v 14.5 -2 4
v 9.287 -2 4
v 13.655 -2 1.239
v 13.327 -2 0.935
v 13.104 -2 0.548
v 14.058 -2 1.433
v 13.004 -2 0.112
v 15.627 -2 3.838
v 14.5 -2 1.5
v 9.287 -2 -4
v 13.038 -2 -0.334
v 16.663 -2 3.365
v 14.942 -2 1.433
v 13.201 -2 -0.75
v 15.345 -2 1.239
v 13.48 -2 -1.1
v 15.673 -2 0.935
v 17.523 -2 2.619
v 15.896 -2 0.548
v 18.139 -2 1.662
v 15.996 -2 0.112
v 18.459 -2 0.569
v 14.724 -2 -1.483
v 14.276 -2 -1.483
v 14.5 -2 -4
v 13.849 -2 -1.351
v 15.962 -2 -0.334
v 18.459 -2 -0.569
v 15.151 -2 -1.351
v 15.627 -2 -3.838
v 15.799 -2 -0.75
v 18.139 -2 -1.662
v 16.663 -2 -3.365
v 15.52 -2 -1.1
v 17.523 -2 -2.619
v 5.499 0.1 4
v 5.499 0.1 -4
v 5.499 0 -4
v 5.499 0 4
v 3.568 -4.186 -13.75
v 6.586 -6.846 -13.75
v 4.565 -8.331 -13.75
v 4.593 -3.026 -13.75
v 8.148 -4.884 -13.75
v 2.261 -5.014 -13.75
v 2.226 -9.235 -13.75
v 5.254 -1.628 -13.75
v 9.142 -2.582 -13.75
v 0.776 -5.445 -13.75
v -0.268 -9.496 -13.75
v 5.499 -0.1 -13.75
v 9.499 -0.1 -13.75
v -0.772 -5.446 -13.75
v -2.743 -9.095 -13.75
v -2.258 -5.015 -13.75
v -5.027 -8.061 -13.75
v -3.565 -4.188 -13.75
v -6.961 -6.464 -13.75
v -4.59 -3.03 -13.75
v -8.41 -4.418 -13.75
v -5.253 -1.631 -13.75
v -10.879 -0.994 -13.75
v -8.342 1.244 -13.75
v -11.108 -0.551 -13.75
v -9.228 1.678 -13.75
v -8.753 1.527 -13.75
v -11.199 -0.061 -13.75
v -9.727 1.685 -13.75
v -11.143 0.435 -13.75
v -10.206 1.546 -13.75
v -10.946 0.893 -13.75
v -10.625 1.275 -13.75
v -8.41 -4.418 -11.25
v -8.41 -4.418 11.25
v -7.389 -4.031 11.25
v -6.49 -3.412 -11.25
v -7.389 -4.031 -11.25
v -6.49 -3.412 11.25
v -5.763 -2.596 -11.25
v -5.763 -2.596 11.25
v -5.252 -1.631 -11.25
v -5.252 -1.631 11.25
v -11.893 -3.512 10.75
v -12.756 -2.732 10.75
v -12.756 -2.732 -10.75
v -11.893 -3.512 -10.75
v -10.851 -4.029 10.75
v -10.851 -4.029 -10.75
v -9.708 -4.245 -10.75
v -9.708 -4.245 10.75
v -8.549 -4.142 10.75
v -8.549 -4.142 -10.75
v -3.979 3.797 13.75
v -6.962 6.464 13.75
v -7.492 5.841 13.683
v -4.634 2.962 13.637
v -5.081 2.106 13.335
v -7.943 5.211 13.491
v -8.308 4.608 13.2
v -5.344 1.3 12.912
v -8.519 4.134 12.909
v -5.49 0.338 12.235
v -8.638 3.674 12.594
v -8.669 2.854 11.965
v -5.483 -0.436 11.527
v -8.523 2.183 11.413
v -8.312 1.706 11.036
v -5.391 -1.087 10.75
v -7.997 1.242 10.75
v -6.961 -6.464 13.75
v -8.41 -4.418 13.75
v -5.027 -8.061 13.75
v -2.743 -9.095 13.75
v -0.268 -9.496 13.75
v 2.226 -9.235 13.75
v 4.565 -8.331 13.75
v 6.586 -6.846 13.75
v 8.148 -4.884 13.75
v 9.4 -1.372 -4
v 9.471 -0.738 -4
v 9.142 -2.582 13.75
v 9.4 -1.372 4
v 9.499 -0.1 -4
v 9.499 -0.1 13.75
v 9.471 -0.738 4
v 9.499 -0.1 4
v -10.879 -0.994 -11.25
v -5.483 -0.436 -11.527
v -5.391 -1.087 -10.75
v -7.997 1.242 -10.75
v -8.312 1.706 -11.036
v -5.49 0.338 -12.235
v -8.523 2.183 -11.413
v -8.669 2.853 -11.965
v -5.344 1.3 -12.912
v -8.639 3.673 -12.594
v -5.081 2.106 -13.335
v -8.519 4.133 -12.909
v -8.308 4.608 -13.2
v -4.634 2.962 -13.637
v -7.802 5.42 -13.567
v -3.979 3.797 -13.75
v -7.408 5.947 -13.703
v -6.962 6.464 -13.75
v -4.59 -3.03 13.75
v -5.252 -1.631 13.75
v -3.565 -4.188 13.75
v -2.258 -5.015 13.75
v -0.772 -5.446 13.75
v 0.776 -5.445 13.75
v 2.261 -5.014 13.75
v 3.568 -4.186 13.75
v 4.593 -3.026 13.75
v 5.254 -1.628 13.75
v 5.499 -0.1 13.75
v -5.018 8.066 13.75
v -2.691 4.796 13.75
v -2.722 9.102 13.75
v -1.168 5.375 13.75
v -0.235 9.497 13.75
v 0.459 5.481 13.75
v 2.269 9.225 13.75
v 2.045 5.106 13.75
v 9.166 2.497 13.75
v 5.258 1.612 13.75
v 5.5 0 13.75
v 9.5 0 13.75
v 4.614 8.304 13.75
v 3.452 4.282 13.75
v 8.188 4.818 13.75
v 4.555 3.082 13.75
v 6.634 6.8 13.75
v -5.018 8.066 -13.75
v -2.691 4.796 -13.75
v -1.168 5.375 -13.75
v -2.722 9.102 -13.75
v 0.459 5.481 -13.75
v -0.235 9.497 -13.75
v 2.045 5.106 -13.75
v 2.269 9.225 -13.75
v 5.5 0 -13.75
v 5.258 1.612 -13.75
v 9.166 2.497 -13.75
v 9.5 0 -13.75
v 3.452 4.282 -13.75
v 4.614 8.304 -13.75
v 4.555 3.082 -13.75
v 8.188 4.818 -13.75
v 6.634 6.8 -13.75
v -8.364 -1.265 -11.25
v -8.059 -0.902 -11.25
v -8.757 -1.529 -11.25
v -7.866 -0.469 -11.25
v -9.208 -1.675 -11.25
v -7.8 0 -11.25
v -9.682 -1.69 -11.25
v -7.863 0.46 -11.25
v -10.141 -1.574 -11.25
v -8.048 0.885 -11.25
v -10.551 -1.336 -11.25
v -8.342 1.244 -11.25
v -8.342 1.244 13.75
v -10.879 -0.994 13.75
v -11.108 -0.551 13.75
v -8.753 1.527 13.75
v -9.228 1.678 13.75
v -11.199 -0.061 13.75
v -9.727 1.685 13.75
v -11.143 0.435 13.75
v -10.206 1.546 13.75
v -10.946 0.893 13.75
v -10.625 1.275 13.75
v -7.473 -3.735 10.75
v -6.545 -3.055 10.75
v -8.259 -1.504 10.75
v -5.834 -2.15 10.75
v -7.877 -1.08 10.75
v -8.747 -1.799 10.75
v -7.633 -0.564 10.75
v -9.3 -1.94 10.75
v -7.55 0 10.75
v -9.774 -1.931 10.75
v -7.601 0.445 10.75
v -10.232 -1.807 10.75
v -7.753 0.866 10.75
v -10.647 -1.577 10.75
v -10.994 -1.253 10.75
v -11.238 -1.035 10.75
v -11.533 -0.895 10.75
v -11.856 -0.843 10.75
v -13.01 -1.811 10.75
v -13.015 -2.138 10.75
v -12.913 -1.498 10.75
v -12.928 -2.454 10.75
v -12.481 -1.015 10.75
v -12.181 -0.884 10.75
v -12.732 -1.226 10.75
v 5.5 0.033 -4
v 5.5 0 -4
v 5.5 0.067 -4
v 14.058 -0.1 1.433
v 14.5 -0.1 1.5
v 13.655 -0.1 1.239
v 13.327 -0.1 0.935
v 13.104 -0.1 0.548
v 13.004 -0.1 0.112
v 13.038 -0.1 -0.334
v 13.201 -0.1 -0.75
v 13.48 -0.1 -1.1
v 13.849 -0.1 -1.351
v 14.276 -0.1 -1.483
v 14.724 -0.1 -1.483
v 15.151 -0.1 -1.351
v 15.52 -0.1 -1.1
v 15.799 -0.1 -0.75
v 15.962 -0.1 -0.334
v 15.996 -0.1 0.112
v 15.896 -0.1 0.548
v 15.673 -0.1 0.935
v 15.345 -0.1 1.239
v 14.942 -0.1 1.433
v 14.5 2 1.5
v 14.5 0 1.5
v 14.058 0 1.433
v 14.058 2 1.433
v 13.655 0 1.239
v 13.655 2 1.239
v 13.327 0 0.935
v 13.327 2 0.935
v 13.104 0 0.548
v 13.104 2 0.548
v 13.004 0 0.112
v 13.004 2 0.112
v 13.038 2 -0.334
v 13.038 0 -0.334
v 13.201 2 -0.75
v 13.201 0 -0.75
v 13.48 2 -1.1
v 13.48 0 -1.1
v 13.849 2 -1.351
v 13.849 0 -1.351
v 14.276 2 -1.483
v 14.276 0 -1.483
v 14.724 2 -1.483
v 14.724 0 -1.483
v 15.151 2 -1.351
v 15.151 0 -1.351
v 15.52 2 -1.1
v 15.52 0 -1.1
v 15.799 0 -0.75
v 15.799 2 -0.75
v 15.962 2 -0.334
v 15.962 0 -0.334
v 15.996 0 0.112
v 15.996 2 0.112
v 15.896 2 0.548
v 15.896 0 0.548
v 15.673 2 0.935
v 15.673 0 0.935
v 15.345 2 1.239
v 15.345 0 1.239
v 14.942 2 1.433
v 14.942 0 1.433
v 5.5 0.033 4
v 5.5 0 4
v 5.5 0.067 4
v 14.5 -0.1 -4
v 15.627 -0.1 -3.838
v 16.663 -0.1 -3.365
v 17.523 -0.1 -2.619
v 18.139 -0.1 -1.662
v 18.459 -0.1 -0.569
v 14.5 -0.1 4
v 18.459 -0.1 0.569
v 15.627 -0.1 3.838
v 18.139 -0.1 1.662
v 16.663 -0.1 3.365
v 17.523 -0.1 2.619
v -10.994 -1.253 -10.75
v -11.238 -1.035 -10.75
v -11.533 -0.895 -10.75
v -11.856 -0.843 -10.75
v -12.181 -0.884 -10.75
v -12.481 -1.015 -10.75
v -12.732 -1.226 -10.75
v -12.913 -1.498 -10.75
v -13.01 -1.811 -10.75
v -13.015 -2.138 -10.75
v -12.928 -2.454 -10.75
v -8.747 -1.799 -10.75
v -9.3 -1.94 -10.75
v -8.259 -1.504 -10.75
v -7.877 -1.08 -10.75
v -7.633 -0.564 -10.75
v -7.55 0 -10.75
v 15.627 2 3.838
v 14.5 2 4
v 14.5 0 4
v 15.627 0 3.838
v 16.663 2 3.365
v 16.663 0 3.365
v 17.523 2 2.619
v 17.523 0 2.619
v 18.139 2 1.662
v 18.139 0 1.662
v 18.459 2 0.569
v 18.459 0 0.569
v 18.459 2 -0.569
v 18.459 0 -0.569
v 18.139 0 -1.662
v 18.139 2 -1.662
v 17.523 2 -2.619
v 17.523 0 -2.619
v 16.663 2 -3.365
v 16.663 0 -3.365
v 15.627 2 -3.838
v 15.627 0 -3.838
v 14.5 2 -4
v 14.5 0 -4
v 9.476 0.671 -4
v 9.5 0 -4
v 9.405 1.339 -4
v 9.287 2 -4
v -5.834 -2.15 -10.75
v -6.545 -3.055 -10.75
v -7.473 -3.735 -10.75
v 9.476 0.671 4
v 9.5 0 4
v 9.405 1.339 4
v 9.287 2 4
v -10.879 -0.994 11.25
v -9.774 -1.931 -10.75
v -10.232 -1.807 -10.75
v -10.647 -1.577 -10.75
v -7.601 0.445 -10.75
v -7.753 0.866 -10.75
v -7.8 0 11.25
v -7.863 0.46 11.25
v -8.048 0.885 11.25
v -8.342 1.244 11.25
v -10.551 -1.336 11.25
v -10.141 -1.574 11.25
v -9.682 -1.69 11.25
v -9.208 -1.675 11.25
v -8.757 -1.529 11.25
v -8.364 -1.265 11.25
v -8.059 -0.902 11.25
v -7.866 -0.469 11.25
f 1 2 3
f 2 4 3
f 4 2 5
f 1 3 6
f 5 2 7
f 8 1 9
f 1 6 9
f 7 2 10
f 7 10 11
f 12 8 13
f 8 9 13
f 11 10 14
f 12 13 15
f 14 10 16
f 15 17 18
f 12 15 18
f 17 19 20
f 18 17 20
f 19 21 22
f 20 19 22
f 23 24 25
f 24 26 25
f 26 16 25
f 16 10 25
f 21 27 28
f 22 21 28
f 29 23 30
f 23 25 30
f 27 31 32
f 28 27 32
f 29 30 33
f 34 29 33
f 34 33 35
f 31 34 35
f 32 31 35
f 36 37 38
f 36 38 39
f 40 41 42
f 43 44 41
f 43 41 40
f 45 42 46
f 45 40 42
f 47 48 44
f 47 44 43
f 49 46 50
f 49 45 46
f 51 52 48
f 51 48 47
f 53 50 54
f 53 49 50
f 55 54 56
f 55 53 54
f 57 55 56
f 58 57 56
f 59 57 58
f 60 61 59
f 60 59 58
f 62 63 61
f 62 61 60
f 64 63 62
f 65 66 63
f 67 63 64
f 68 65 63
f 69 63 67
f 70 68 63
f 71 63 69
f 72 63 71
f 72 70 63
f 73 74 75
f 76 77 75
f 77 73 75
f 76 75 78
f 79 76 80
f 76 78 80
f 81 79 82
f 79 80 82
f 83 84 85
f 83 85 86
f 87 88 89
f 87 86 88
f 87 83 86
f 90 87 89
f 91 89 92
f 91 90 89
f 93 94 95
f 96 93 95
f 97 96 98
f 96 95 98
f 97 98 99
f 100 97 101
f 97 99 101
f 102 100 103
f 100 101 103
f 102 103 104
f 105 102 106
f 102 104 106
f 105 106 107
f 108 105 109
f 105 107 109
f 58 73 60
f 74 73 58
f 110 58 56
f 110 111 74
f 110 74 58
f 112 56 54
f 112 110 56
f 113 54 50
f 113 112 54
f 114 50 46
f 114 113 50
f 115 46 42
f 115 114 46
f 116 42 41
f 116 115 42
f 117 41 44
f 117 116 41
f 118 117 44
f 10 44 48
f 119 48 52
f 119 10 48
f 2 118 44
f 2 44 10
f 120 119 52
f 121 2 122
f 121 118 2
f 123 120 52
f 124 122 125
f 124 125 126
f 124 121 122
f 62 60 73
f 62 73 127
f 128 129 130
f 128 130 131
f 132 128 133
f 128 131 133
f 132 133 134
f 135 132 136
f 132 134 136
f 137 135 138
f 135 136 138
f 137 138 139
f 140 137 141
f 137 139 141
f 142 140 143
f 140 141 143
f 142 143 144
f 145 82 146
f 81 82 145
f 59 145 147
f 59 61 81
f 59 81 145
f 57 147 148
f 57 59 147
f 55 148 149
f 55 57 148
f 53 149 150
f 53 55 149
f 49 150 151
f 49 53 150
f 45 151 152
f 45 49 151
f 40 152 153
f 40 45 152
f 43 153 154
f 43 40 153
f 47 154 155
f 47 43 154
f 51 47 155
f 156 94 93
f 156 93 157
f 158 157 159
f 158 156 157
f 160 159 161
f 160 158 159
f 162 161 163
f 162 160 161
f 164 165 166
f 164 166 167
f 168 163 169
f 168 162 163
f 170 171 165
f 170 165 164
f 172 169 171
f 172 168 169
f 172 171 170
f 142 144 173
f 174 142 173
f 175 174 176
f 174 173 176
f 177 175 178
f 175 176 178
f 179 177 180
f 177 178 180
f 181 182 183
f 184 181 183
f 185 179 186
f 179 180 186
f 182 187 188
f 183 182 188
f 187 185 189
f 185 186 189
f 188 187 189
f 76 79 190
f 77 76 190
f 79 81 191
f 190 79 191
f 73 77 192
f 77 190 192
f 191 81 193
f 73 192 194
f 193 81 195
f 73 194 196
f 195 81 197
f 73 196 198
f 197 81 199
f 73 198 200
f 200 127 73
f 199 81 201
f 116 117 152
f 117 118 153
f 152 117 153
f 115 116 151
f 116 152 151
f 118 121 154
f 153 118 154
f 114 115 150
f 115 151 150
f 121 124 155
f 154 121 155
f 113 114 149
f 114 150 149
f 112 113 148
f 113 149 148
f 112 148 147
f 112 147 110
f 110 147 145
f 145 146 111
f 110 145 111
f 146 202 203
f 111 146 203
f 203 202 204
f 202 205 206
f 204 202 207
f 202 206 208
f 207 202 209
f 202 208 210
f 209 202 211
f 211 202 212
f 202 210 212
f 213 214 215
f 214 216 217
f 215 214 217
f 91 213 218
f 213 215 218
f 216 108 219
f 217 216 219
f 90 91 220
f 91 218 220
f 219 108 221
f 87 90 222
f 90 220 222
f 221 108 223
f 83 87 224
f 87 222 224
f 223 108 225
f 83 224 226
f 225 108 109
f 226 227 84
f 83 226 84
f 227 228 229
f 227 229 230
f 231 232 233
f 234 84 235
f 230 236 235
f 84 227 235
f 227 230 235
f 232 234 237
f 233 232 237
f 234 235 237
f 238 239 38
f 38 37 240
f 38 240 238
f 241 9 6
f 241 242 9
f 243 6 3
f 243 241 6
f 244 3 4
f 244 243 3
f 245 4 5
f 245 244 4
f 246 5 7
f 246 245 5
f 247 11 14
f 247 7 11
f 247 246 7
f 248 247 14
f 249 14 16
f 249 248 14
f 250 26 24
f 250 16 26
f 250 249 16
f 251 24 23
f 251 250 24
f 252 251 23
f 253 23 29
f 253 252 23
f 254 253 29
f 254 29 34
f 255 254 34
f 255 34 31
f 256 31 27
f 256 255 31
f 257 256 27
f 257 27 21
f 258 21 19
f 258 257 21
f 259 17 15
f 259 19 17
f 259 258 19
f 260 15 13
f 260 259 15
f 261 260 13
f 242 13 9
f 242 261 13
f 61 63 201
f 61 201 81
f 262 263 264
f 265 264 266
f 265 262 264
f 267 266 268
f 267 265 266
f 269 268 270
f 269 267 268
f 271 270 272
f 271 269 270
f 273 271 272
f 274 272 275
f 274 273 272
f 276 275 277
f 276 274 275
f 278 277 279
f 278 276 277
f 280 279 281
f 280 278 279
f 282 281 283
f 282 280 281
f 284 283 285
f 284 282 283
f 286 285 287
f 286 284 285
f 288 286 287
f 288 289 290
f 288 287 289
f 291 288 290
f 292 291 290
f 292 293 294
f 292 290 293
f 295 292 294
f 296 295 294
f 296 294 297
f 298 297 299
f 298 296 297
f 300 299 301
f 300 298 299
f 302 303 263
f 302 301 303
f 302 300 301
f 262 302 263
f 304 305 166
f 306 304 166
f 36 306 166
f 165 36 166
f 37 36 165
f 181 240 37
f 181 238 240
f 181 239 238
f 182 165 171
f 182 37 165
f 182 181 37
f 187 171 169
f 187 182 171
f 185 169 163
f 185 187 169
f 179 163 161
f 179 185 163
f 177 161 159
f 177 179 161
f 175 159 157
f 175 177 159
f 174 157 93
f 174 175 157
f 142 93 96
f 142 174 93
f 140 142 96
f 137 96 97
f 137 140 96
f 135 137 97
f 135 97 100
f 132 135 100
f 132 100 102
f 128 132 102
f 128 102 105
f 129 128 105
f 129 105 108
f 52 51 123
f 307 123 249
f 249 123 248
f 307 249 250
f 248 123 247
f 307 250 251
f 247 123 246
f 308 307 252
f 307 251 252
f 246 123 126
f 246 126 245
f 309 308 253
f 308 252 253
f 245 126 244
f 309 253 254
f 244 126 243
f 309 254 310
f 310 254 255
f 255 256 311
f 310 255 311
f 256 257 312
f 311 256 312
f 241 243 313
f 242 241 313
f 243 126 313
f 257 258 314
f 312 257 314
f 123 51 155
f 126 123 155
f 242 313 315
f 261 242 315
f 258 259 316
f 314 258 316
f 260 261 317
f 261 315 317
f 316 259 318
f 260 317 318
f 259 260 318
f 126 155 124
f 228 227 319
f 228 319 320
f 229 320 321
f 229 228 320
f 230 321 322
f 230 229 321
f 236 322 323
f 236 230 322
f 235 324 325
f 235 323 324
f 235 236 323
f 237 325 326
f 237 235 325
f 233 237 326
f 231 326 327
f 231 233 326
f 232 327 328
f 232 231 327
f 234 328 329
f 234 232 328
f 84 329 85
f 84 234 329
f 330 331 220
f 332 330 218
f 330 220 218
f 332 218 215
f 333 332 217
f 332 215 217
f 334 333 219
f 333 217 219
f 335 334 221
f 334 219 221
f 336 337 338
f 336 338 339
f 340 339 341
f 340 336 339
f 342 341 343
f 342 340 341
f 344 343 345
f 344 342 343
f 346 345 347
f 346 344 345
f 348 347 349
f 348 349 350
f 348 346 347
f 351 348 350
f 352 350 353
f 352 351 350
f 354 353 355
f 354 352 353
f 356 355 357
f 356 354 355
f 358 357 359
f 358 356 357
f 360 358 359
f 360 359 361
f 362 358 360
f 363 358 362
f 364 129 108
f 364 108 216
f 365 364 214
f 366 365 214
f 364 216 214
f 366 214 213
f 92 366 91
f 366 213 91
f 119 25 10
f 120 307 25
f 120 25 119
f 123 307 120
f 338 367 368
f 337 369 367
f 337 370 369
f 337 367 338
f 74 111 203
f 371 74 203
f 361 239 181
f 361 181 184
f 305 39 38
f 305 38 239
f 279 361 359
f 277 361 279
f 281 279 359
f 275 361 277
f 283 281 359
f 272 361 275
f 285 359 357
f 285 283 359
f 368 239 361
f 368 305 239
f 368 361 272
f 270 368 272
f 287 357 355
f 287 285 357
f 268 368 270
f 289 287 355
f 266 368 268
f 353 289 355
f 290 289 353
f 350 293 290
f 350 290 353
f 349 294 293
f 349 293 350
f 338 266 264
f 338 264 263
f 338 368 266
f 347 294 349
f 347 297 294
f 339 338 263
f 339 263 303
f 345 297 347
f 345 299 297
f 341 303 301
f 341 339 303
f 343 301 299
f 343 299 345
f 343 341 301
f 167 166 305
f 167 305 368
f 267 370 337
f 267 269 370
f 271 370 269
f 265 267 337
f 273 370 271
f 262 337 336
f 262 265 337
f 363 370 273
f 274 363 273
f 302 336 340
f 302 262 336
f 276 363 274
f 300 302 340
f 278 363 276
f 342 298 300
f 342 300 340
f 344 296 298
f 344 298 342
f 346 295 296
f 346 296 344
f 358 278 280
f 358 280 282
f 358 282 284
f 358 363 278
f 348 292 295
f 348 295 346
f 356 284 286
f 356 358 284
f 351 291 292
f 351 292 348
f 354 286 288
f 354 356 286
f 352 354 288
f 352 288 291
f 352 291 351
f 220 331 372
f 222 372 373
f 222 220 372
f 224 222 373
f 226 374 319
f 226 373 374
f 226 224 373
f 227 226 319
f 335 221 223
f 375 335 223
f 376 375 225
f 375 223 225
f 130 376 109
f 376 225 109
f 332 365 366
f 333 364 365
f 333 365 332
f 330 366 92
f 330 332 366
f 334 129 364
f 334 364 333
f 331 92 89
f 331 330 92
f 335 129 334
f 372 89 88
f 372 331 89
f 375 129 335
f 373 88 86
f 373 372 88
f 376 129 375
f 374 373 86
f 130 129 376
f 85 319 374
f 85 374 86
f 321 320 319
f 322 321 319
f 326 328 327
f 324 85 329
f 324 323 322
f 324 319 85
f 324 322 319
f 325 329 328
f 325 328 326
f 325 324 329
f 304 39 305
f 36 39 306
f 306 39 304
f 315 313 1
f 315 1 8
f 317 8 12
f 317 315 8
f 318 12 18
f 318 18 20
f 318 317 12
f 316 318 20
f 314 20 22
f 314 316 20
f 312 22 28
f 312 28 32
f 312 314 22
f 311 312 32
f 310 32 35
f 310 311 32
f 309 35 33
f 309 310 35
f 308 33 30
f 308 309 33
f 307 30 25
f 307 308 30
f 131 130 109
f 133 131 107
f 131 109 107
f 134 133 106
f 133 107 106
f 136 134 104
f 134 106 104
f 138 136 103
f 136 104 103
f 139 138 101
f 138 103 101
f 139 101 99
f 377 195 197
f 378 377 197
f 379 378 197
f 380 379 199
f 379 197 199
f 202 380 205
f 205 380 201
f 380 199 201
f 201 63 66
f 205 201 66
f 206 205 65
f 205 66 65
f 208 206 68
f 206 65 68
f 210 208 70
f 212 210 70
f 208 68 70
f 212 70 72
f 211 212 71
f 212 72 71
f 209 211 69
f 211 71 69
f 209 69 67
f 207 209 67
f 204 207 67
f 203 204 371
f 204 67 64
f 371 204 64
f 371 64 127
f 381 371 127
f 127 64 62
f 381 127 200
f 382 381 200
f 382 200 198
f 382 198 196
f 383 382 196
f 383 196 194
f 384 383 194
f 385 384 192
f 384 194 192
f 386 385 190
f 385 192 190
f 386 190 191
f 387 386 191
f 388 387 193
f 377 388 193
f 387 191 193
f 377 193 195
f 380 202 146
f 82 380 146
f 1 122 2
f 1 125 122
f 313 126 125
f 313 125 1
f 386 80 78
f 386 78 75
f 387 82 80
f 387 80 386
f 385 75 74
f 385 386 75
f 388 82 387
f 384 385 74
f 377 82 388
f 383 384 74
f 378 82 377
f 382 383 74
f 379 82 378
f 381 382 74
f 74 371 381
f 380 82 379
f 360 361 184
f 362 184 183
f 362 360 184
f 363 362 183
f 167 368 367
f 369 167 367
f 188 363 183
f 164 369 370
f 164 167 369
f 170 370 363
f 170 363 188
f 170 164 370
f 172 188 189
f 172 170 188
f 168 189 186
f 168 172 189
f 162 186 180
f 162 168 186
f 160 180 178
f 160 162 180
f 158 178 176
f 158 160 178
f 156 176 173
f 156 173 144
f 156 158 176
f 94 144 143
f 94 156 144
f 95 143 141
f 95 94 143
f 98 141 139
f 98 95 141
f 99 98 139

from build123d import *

# Parameters (mm, degrees)
SKETCH1_R                = 9.5
SKETCH1_R_2              = 5.5
BOSS_EXTRUDE1_DEPTH      = 13.75
CUT_EXTRUDE2_DEPTH       = 31.606371886
CUT_EXTRUDE3_DEPTH       = 31.606371886
BOSS_EXTRUDE3_DEPTH      = 27.5
BOSS_EXTRUDE4_DEPTH      = 13.75
BOSS_EXTRUDE4_DEPTH_BACK = 13.75
SKETCH8_R                = 1.7
BOSS_EXTRUDE5_DEPTH      = 2.5
CUT_EXTRUDE4_DEPTH       = 3
FILLET1_R                = 5
BOSS_EXTRUDE6_DEPTH      = 2
SKETCH13_W               = 13.523517167
SKETCH13_H               = 0.1
CUT_EXTRUDE5_DEPTH       = 28.3415893


with BuildPart() as part:
    # Sketch1 → Boss-Extrude1 (new, symmetric)
    with BuildSketch(Plane.XY):
        Circle(SKETCH1_R)
        Circle(SKETCH1_R_2, mode=Mode.SUBTRACT)
    extrude(amount=BOSS_EXTRUDE1_DEPTH, both=True)

    # Sketch3 → Cut-Extrude2 (cut, through all)
    with BuildSketch(Plane.XY.offset(13.75)):
        with BuildLine():
            ThreePointArc((5.5, 0), (5.499772704, -0.050002066), (5.499090834, -0.1))
            Line((5.499090834, -0.1), (9.49947367, -0.1))
            ThreePointArc((9.49947367, -0.1), (9.499868416, -0.050000693), (9.5, 0))
            Line((9.5, 0), (5.5, 0))
        make_face()
        with BuildLine():
            ThreePointArc((-8.410394737, -4.417607992), (-6.489683277, -3.411816705), (-5.2525, -1.631331894))
            ThreePointArc((-5.2525, -1.631331894), (-5.328919902, -1.361107153), (-5.391447368, -1.087334021))
            ThreePointArc((-5.391447368, -1.087334021), (-6.544982985, -3.054566162), (-8.549342105, -4.142312104))
            ThreePointArc((-8.549342105, -4.142312104), (-8.48098552, -4.28052387), (-8.410394737, -4.417607992))
        make_face()
    extrude(amount=-CUT_EXTRUDE2_DEPTH, mode=Mode.SUBTRACT)


with BuildPart() as cut_extrude2_piece_1:
    # of the separate pieces the step leaves, piece 1, a body of its own (cut_extrude2_pieces)
    add(part.part.solids().sort_by_distance((9.5, 0, -13.75))[0])

    # Sketch4 → Cut-Extrude3 (cut, through all)
    with BuildSketch(Plane.XY.offset(13.75)):
        with BuildLine():
            ThreePointArc((-9.299868421, 1.939702903), (-8.579652656, 1.719145359), (-7.996758373, 1.242080759))
            ThreePointArc((-7.996758373, 1.242080759), (-8.67137707, 2.877202726), (-8.3075, 4.608193111))
            ThreePointArc((-8.3075, 4.608193111), (-8.904216174, 3.311334221), (-9.299868421, 1.939702903))
        make_face()
        with BuildLine():
            ThreePointArc((-9.299868421, -1.939702903), (-8.052112473, -1.30618594), (-7.55, 0))
            ThreePointArc((-7.55, 0), (-7.665085673, 0.65999198), (-7.996758373, 1.242080759))
            ThreePointArc((-7.996758373, 1.242080759), (-8.579652656, 1.719145359), (-9.299868421, 1.939702903))
            ThreePointArc((-9.299868421, 1.939702903), (-9.5, 0), (-9.299868421, -1.939702903))
        make_face()
        with BuildLine():
            ThreePointArc((-9.299868421, 1.939702903), (-11.45, 0), (-9.299868421, -1.939702903))
            ThreePointArc((-9.299868421, -1.939702903), (-9.5, 0), (-9.299868421, 1.939702903))
        make_face()
    extrude(amount=-CUT_EXTRUDE3_DEPTH, mode=Mode.SUBTRACT)

    # Sketch5 → Boss-Extrude3 (add, through all)
    with BuildSketch(Plane.XY.offset(13.75)):
        with BuildLine():
            Line((-10.993786664, -1.253435839), (-12.755688883, -2.731847341))
            ThreePointArc((-12.755688883, -2.731847341), (-10.851164193, -4.029498148), (-8.549342105, -4.142312104))
            ThreePointArc((-8.549342105, -4.142312104), (-8.992299535, -3.064073934), (-9.299868421, -1.939702903))
            ThreePointArc((-9.299868421, -1.939702903), (-10.23220659, -1.807311127), (-10.993786664, -1.253435839))
        make_face()
        with BuildLine():
            ThreePointArc((-10.993786664, -1.253435839), (-12.613943525, -1.11169048), (-12.755688883, -2.731847341))
            Line((-12.755688883, -2.731847341), (-10.993786664, -1.253435839))
        make_face()
    extrude(amount=-BOSS_EXTRUDE3_DEPTH)

    # Sketch11 → Cut-Extrude4 (cut)
    with BuildSketch(Plane.XY.offset(13.75)):
        with BuildLine():
            Line((-7.996758373, 1.242080759), (-5.391447368, -1.087334021))
            ThreePointArc((-5.391447368, -1.087334021), (-8.57374401, -4.147836767), (-12.755688883, -2.731847341))
            ThreePointArc((-12.755688883, -2.731847341), (-12.613943525, -1.11169048), (-10.993786664, -1.253435839))
            ThreePointArc((-10.993786664, -1.253435839), (-8.252232745, -1.498524901), (-7.996758373, 1.242080759))
        make_face()
    cut_extrude4 = extrude(amount=-CUT_EXTRUDE4_DEPTH, mode=Mode.SUBTRACT)

    # Mirror2: Cut-Extrude4 across plane
    add(cut_extrude4.mirror(Plane.XY), mode=Mode.SUBTRACT)

    # Fillet1
    # the kernel refuses this fillet: 5 mm, written as the material it takes off along each edge
    with BuildSketch(Plane(origin=(-16.537262293, 8.878165672, 13.75), x_dir=(0.6665321357814128, 0.7454762987316689, 0), z_dir=(0.7454762987316689, -0.6665321357814128, 0))) as fillet1_piece_1:
        with BuildLine():
            CenterArc((4.582575695, -5), FILLET1_R, 90, 66.421821522)
            Line((0, -3), (0, 0))
            Line((0, 0), (4.582575695, 0))
        make_face()
    extrude(amount=26.407705888, mode=Mode.SUBTRACT)
    with BuildSketch(Plane(origin=(-16.537262293, 8.878165672, -13.75), x_dir=(0.6665321357814128, 0.7454762987316689, 0), z_dir=(0.7454762987316689, -0.6665321357814128, 0))) as fillet1_piece_2:
        with BuildLine():
            CenterArc((4.582575695, 5), FILLET1_R, 203.578178478, 66.421821522)
            Line((0, 3), (0, 0))
            Line((0, 0), (4.582575695, 0))
        make_face()
    extrude(amount=26.407705888, mode=Mode.SUBTRACT)



with BuildPart() as cut_extrude2_piece_2:
    # of the separate pieces the step leaves, piece 2, a body of its own (cut_extrude2_pieces)
    add(part.part.solids().sort_by_distance((-8.410394737, -4.417607992, -13.75))[0])



with BuildPart() as body_3:
    # Sketch8 → Boss-Extrude4 (new, two sides: drawn at the far end of the back side and taken through both)
    with BuildSketch(Plane.XY.offset(-BOSS_EXTRUDE4_DEPTH_BACK)):
        with Locations((-9.5, 0)):
            Circle(SKETCH8_R)
    extrude(amount=BOSS_EXTRUDE4_DEPTH + BOSS_EXTRUDE4_DEPTH_BACK)


with BuildPart() as cut_extrude2_piece_2_1:
    add(cut_extrude2_piece_2.part)

    add(body_3.part)  # Boss-Extrude5 merges body 3
    # Sketch9 → Boss-Extrude5 (add)
    with BuildSketch(Plane.XY.offset(13.75)):
        with BuildLine():
            Line((-8.410394737, -4.417607992), (-10.878896679, -0.994305762))
            ThreePointArc((-10.878896679, -0.994305762), (-8.375266279, -1.274744703), (-8.341695586, 1.244319446))
            Line((-8.341695586, 1.244319446), (-5.2525, -1.631331894))
            ThreePointArc((-5.2525, -1.631331894), (-6.489683277, -3.411816705), (-8.410394737, -4.417607992))
        make_face()
    boss_extrude5 = extrude(amount=-BOSS_EXTRUDE5_DEPTH)

    # Mirror1: Boss-Extrude5 across plane
    add(boss_extrude5.mirror(Plane.XY))


with BuildPart() as cut_extrude2_piece_1_1:
    add(cut_extrude2_piece_1.part)

    add(cut_extrude2_piece_2_1.part)  # Boss-Extrude6 merges Cut-Extrude2 piece 2
    # Sketch12 → Boss-Extrude6 (add, symmetric)
    with BuildSketch(Plane(origin=(0, 0, 0), x_dir=(1, 0, 0), z_dir=(0, 1, 0))):
        with BuildLine():
            Line((14.5, 4), (5.499090834, 4))
            Line((5.499090834, 4), (5.499090834, -4))
            Line((5.499090834, -4), (14.5, -4))
            ThreePointArc((14.5, -4), (18.5, 0), (14.5, 4))
        make_face()
    extrude(amount=BOSS_EXTRUDE6_DEPTH, both=True)

    # Sketch13 → Cut-Extrude5 (cut, through all)
    with BuildSketch(Plane.XY.offset(4)):
        with Locations((12.260849418, -0.05)):
            Rectangle(SKETCH13_W, SKETCH13_H)
    extrude(amount=-CUT_EXTRUDE5_DEPTH, mode=Mode.SUBTRACT)


with BuildPart() as cut_extrude5_piece_1:
    # of the separate pieces the step leaves, piece 1, a body of its own (cut_extrude5_pieces)
    add(cut_extrude2_piece_1_1.part.solids().sort_by_distance((9.5, 0, 4))[0])


with BuildPart() as cut_extrude5_piece_2:
    # of the separate pieces the step leaves, piece 2, a body of its own (cut_extrude5_pieces)
    add(cut_extrude2_piece_1_1.part.solids().sort_by_distance((-8.410394737, -4.417607992, -11.25))[0])


with BuildPart() as f_1_0mm_dowel_hole1_tool:
    # Sketch15 → Ø1.0mm Dowel Hole1 (revolve)
    with BuildSketch(Plane(origin=(14.5, 2, 0), x_dir=(0, 0, 1), z_dir=(1, 0, 0))):
        Polygon((0, 0), (0, 50), (1.5, 49.098709071), (1.5, 0), align=None)
    revolve(axis=Axis((14.5, 8.35, 0), (0, -1, 0)))


with BuildPart() as cut_extrude5_piece_1_1:
    add(cut_extrude5_piece_1.part)

    # Ø1.0mm Dowel Hole1: cut by f_1_0mm_dowel_hole1_tool
    add(f_1_0mm_dowel_hole1_tool.part, mode=Mode.SUBTRACT)


with BuildPart() as cut_extrude5_piece_2_1:
    add(cut_extrude5_piece_2.part)

    # Ø1.0mm Dowel Hole1: cut by f_1_0mm_dowel_hole1_tool
    add(f_1_0mm_dowel_hole1_tool.part, mode=Mode.SUBTRACT)


solid = Compound([cut_extrude5_piece_1_1.part, cut_extrude5_piece_2_1.part])
